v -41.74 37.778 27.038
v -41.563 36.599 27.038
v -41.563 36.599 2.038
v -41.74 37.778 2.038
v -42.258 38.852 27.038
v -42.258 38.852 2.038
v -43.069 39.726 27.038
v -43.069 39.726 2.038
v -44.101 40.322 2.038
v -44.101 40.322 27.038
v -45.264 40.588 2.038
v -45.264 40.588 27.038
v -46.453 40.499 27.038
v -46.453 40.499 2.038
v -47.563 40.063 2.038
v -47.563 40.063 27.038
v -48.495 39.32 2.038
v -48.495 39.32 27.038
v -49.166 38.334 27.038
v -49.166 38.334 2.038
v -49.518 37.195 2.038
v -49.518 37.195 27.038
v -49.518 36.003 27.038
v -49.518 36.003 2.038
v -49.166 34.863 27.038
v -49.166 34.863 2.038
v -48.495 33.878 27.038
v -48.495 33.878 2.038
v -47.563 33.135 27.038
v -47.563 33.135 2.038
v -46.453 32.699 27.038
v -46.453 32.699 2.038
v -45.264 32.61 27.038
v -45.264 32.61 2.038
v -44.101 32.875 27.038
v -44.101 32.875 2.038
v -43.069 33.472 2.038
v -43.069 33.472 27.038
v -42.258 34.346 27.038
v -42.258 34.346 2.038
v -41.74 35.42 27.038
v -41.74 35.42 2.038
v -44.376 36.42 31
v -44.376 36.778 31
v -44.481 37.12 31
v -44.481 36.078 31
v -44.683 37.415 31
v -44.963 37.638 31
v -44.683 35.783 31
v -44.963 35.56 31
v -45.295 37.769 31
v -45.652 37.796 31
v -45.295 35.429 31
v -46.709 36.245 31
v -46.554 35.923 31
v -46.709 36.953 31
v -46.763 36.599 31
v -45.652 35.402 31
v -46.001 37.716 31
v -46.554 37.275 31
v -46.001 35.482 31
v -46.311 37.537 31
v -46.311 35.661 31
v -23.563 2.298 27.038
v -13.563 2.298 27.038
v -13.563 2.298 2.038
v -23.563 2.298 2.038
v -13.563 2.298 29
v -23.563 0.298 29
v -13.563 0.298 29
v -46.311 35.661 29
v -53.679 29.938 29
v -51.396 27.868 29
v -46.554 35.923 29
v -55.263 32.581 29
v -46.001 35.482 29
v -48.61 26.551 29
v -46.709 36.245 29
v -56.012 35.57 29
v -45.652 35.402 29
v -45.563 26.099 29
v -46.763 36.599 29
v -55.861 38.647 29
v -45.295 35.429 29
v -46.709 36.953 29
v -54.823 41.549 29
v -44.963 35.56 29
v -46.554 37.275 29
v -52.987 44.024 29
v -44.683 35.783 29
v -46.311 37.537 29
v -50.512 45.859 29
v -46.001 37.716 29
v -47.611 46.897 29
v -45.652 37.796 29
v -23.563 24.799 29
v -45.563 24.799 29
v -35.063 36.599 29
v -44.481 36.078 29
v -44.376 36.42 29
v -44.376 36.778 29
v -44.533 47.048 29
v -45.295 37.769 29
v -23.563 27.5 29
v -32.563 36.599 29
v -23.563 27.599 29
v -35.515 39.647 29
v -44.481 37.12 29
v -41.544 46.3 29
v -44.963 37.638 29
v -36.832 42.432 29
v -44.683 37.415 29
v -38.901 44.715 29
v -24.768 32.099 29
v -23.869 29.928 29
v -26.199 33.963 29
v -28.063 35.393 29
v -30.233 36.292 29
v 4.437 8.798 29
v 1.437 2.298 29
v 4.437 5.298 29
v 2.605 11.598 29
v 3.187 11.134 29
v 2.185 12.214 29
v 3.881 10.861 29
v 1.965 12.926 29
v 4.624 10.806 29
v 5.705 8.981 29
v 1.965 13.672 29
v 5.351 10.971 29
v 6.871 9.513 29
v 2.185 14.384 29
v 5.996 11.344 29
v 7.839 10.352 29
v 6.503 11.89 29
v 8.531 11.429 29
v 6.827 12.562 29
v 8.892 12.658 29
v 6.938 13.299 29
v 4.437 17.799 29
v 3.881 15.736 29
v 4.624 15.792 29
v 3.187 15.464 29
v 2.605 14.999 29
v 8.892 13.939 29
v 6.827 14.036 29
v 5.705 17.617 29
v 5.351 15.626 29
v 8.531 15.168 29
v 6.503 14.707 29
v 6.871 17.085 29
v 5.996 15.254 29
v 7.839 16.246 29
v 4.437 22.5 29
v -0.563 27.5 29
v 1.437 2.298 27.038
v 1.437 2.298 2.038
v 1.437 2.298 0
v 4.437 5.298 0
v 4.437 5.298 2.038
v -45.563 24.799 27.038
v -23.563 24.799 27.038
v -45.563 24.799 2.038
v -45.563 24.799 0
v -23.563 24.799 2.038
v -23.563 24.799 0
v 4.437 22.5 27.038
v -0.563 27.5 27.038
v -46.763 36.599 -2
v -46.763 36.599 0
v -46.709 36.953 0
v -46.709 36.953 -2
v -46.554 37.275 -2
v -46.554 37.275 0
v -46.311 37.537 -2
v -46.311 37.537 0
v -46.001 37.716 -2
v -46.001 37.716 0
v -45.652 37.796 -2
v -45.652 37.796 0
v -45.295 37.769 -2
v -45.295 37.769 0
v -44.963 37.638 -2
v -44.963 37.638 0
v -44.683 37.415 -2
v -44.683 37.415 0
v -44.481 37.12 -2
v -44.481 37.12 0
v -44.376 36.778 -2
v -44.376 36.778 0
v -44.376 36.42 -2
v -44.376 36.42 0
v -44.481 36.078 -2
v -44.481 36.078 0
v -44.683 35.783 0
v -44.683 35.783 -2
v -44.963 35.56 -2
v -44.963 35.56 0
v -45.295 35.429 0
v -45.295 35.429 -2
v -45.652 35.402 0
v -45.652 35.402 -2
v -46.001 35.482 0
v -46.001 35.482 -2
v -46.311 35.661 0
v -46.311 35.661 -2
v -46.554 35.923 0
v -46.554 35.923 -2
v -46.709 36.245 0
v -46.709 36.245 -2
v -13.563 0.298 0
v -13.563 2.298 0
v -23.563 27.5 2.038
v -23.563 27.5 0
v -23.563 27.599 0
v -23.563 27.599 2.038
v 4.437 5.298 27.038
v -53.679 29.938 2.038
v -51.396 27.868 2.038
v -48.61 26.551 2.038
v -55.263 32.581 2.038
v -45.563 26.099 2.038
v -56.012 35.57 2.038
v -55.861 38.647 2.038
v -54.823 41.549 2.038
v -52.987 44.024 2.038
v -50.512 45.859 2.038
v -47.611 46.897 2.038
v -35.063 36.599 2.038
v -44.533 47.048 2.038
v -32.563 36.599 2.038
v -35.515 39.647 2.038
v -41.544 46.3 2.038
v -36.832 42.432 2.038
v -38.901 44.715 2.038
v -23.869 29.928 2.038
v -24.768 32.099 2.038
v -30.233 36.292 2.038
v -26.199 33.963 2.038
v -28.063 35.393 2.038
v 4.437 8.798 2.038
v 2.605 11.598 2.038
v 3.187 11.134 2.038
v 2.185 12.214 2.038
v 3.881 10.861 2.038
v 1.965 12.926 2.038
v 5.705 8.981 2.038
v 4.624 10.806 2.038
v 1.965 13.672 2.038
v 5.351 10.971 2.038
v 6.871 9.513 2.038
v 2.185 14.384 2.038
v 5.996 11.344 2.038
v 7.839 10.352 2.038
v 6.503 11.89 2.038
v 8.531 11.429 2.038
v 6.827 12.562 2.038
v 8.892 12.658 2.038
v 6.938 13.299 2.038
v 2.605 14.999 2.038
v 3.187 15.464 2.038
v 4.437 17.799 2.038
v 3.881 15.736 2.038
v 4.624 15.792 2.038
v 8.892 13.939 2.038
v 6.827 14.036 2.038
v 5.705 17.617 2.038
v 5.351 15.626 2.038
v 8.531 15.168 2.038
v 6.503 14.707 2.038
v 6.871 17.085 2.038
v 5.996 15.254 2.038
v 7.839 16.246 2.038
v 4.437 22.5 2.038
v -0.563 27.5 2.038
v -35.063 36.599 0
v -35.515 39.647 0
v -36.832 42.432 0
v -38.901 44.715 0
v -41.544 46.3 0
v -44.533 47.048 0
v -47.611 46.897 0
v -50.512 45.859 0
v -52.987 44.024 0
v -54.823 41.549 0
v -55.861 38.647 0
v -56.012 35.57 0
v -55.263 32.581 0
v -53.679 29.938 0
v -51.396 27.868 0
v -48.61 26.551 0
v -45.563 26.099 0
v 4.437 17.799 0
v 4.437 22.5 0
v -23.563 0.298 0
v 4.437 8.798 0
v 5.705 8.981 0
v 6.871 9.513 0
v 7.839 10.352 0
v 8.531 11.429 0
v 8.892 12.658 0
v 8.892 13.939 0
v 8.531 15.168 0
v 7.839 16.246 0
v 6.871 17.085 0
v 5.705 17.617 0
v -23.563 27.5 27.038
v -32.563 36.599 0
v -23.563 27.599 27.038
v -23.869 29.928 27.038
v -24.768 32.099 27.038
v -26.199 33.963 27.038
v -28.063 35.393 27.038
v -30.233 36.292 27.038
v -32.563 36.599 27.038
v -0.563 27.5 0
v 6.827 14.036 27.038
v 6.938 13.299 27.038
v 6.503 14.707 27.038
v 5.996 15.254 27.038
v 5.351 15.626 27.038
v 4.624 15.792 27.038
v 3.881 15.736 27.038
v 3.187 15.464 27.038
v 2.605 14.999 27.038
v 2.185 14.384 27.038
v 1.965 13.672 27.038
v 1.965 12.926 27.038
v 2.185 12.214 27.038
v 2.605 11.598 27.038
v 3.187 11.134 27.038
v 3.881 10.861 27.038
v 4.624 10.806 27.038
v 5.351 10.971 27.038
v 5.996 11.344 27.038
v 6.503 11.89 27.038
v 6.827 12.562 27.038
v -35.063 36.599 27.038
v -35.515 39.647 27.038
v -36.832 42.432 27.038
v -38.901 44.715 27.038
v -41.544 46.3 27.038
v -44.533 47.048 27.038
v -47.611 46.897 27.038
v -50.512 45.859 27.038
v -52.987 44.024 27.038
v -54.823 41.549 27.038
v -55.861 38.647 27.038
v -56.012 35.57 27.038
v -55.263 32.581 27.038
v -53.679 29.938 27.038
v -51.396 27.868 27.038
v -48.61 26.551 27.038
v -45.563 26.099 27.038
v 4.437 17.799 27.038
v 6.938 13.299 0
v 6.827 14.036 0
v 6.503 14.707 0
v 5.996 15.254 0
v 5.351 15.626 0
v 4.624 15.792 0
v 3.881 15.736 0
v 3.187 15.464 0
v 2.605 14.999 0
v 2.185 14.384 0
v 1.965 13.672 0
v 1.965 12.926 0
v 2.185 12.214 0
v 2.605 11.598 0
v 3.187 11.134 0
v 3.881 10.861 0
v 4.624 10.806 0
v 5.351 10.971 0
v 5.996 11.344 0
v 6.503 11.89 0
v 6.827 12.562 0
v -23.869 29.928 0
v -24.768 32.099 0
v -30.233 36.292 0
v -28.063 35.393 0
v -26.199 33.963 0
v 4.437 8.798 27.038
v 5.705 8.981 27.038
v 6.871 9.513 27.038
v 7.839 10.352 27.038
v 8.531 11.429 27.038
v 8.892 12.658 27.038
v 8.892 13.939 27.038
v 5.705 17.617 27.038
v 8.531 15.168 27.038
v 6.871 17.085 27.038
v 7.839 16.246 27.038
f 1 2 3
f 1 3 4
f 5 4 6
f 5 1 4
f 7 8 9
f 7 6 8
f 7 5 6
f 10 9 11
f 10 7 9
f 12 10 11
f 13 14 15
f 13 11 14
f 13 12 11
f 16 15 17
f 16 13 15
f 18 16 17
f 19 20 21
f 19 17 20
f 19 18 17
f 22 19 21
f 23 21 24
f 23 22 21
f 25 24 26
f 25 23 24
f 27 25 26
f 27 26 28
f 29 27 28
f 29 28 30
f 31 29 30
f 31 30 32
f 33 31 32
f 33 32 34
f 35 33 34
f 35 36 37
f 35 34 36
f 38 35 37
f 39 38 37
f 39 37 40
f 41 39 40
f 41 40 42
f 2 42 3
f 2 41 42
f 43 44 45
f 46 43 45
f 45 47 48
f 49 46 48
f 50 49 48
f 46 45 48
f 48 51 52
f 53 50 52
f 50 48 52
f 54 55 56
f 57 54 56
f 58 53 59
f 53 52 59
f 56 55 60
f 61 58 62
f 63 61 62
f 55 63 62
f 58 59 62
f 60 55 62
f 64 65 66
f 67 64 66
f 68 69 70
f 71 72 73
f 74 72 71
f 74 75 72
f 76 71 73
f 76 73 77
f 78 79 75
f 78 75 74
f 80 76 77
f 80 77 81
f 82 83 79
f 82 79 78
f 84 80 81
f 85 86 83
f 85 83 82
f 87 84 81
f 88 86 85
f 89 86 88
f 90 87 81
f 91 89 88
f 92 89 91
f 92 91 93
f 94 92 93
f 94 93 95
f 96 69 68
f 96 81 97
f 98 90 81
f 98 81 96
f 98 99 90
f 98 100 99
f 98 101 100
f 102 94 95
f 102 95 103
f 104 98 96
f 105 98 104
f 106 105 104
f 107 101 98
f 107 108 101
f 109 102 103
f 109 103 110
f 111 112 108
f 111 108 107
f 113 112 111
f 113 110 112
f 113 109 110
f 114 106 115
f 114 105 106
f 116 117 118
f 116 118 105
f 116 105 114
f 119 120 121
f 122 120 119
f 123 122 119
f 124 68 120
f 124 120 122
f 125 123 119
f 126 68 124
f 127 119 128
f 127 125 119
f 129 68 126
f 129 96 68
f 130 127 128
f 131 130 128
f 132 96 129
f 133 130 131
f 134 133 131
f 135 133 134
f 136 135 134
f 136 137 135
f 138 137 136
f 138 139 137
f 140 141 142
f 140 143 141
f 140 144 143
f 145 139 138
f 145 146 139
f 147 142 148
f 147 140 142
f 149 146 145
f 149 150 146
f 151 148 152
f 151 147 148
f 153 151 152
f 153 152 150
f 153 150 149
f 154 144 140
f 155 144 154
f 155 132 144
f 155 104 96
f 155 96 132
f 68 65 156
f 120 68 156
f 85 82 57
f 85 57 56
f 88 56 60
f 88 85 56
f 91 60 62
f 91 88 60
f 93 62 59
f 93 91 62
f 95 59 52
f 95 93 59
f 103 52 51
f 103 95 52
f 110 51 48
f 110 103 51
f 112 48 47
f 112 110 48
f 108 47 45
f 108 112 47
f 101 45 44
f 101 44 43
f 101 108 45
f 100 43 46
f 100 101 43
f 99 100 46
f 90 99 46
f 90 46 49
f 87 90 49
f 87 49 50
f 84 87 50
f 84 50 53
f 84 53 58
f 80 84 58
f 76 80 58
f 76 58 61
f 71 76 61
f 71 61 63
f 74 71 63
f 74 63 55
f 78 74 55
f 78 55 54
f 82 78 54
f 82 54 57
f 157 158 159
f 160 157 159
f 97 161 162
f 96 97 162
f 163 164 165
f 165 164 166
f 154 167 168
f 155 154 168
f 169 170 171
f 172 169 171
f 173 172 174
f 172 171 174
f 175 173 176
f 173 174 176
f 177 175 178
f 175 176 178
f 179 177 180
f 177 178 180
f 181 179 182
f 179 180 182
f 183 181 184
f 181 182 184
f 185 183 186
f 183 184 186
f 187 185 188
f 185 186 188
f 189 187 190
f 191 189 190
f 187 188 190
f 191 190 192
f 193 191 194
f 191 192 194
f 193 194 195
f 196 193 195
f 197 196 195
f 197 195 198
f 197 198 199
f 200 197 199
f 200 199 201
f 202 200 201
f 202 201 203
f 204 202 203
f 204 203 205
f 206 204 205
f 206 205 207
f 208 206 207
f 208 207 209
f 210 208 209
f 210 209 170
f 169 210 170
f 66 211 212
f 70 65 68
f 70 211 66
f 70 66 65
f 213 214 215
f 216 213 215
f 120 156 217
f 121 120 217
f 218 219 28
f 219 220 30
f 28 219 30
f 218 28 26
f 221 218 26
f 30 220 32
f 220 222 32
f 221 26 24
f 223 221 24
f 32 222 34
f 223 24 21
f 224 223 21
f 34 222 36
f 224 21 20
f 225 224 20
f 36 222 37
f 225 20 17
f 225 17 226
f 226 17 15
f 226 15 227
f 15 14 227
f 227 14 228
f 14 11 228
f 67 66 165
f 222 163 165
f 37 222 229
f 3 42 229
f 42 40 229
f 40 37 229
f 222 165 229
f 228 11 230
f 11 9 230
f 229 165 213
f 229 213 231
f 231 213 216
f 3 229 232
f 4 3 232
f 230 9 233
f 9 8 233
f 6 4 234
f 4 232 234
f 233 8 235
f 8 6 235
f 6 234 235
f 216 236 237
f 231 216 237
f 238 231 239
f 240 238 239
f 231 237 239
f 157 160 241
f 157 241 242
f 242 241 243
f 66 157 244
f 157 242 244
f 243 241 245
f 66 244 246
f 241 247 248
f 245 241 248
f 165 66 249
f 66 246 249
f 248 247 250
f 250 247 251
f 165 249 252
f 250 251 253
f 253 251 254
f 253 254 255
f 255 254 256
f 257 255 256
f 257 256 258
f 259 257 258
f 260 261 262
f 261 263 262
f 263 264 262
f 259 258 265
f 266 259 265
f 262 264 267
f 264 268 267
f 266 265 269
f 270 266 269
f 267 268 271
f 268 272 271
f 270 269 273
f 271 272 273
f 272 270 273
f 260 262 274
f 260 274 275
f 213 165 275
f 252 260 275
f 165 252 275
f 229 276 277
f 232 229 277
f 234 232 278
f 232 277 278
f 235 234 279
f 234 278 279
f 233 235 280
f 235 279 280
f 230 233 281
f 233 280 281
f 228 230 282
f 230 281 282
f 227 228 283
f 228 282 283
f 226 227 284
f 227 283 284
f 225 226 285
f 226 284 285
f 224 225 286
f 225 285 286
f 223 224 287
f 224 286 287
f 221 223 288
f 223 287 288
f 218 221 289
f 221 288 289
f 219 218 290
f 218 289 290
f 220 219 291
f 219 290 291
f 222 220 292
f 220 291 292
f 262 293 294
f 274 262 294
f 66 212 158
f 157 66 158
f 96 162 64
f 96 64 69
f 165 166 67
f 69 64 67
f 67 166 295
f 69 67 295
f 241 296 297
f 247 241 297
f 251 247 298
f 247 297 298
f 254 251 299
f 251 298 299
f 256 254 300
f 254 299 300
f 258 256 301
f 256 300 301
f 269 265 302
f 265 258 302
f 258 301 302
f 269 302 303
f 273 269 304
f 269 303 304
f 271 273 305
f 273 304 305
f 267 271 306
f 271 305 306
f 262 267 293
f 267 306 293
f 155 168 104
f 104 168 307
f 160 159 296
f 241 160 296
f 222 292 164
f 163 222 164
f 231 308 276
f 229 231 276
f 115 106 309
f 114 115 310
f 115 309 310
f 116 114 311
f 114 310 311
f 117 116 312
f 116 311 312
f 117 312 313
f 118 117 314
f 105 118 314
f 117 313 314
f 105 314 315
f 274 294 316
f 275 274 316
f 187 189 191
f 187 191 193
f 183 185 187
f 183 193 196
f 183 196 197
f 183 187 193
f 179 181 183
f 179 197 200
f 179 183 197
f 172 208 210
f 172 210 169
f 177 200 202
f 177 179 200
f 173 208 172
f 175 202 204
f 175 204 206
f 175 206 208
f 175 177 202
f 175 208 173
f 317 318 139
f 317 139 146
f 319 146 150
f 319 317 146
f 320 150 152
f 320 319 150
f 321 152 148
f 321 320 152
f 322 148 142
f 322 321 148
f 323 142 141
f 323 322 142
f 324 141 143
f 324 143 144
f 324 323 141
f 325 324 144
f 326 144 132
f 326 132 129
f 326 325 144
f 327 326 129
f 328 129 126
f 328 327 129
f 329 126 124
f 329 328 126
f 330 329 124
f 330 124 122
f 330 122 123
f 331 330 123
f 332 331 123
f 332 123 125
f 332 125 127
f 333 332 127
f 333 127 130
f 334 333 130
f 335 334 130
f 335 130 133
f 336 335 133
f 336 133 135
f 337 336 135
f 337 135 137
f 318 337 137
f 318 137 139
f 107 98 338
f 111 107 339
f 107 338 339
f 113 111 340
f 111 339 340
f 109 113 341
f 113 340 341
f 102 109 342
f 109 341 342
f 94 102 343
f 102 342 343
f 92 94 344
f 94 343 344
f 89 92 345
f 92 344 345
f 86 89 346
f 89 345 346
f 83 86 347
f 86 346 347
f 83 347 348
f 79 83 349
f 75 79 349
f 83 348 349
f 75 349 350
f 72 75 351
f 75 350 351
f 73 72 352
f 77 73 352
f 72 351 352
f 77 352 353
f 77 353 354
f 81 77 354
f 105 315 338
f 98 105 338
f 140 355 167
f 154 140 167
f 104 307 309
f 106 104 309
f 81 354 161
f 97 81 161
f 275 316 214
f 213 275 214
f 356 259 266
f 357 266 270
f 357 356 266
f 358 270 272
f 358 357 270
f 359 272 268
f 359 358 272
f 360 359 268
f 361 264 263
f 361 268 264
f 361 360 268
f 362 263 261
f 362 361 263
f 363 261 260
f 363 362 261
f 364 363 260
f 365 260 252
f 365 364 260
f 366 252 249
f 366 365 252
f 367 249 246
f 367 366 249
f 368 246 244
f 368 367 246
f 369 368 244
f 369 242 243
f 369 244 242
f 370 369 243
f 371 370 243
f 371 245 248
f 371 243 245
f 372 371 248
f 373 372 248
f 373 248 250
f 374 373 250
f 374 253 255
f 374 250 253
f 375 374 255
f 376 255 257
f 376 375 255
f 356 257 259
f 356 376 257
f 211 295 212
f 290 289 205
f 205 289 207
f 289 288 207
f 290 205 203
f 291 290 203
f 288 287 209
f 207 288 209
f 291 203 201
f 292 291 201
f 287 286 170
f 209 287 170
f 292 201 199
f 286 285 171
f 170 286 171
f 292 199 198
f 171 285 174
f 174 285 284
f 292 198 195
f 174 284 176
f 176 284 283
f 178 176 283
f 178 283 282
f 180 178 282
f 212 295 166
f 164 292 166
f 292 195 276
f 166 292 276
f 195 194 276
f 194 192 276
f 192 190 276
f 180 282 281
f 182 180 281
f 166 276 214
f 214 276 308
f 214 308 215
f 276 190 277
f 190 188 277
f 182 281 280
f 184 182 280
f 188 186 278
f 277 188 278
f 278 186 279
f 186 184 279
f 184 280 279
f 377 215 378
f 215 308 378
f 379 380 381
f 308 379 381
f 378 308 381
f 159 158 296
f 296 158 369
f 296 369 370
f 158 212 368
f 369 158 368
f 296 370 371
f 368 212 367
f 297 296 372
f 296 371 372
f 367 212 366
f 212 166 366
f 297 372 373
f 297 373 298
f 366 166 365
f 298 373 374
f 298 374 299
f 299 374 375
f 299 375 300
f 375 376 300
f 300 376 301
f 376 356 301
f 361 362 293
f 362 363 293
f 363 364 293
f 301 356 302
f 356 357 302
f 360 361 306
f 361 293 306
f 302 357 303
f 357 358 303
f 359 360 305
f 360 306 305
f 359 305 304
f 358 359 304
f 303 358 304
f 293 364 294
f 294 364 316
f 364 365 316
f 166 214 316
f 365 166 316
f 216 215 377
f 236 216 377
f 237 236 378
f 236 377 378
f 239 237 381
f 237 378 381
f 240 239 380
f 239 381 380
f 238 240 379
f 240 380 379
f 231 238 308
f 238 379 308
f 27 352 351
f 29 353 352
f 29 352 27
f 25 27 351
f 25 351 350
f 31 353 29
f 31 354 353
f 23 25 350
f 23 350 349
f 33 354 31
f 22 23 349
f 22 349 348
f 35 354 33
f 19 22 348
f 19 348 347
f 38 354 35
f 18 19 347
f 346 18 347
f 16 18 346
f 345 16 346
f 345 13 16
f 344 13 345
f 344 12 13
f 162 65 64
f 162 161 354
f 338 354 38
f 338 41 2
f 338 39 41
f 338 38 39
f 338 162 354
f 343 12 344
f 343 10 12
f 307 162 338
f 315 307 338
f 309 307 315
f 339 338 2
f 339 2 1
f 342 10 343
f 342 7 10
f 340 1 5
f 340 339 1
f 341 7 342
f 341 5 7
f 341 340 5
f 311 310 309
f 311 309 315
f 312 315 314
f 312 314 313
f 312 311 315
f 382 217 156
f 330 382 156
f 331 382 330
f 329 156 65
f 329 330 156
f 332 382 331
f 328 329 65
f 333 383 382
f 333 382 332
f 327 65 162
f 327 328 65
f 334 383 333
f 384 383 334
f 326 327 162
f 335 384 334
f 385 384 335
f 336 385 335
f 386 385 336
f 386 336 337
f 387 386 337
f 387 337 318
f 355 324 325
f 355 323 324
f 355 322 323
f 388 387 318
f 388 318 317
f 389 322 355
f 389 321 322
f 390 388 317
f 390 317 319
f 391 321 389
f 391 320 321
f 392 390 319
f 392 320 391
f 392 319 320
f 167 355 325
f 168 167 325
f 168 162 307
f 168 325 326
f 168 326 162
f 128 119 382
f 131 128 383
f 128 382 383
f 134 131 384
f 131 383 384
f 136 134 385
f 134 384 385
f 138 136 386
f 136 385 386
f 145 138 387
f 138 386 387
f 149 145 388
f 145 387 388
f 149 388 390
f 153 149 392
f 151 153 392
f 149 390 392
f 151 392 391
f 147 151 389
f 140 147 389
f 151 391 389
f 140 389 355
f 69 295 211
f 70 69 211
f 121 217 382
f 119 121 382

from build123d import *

# Parameters (mm, degrees)
SKETCH_1_R           = 4
SKETCH_1_R_2         = 2.50023196
EXTRUDE_3_DEPTH      = 29
SKETCH_5_W           = 29.813353088
SKETCH_5_H           = 25
CUT_EXTRUDE_2_DEPTH  = 50
SKETCH_6_W           = 25
SKETCH_6_H           = 54.055656888
CUT_EXTRUDE_3_DEPTH  = 50
SKETCH_7_R           = 4
SKETCH_7_R_2         = 1.2
EXTRUDE_4_DEPTH      = 29
SKETCH_10_R          = 1.2
EXTRUDE_5_DEPTH      = 2
EXTRUDE_5_DEPTH_BACK = 31


with BuildPart() as part:
    # 草图1 → 凸台-拉伸3 (new body)
    with BuildSketch(Plane.XY):
        with BuildLine():
            Line((-23.562506416, 27.500198397), (-23.562506416, 27.598880866))
            ThreePointArc((-23.562506416, 27.598880866), (-26.198545385, 33.962841897), (-32.562506416, 36.598880866))
            Line((-32.562506416, 36.598880866), (-35.062506416, 36.598880866))
            ThreePointArc((-35.062506416, 36.598880866), (-52.987127618, 44.023502068), (-45.562506416, 26.098880866))
            Line((-45.562506416, 26.098880866), (-45.562506416, 24.798880866))
            Line((-45.562506416, 24.798880866), (-23.562506416, 24.798880866))
            Line((-23.562506416, 24.798880866), (-23.562506416, 2.297860243))
            Line((-23.562506416, 2.297860243), (-23.562506416, 0.297860243))
            Line((-23.562506416, 0.297860243), (-13.562506416, 0.297860243))
            Line((-13.562506416, 0.297860243), (-13.562506416, 2.297860243))
            Line((-13.562506416, 2.297860243), (1.437493584, 2.297860243))
            Line((1.437493584, 2.297860243), (4.437493584, 5.297860243))
            Line((4.437493584, 5.297860243), (4.437493584, 8.798464088))
            ThreePointArc((4.437493584, 8.798464088), (8.937910362, 13.298880866), (4.437493584, 17.799297644))
            Line((4.437493584, 17.799297644), (4.437493584, 22.500198397))
            Line((4.437493584, 22.500198397), (-0.562506416, 27.500198397))
            Line((-0.562506416, 27.500198397), (-23.562506416, 27.500198397))
        make_face()
        with Locations((-45.562506416, 36.598880866)):
            Circle(SKETCH_1_R, mode=Mode.SUBTRACT)
        with Locations((4.437493584, 13.298880866)):
            Circle(SKETCH_1_R_2, mode=Mode.SUBTRACT)
    extrude(amount=EXTRUDE_3_DEPTH)

    # 草图5 → 切除-拉伸2 (cut)
    with BuildSketch(Plane.XZ.offset(-2.297860243)):
        with Locations((1.344170128, 14.537987409)):
            Rectangle(SKETCH_5_W, SKETCH_5_H)
    extrude(amount=-CUT_EXTRUDE_2_DEPTH, mode=Mode.SUBTRACT)

    # 草图6 → 切除-拉伸3 (cut)
    with BuildSketch(Plane(origin=(-13.562506416, 0, 0), x_dir=(0, 0, -1), z_dir=(1, 0, 0))):
        with Locations((-14.537987409, 29.325688687)):
            Rectangle(SKETCH_6_W, SKETCH_6_H)
    extrude(amount=-CUT_EXTRUDE_3_DEPTH, mode=Mode.SUBTRACT)

    # 草图7 → 凸台-拉伸4 (add)
    with BuildSketch(Plane.XY.offset(29)):
        with Locations((-45.562506416, 36.598880866)):
            Circle(SKETCH_7_R)
        with Locations((-45.562506416, 36.598880866)):
            Circle(SKETCH_7_R_2, mode=Mode.SUBTRACT)
    extrude(amount=-EXTRUDE_4_DEPTH)

    # 草图10 → 凸台-拉伸5 (add, two sides)
    with BuildSketch(Plane(origin=(0, 0, 0), x_dir=(-1, 0, 0), z_dir=(0, 0, -1))) as extrude_5_sk:
        with Locations((45.562506416, 36.598880866)):
            Circle(SKETCH_10_R)
    extrude(amount=EXTRUDE_5_DEPTH)
    extrude(extrude_5_sk.sketch, amount=-EXTRUDE_5_DEPTH_BACK)


solid = part.part
